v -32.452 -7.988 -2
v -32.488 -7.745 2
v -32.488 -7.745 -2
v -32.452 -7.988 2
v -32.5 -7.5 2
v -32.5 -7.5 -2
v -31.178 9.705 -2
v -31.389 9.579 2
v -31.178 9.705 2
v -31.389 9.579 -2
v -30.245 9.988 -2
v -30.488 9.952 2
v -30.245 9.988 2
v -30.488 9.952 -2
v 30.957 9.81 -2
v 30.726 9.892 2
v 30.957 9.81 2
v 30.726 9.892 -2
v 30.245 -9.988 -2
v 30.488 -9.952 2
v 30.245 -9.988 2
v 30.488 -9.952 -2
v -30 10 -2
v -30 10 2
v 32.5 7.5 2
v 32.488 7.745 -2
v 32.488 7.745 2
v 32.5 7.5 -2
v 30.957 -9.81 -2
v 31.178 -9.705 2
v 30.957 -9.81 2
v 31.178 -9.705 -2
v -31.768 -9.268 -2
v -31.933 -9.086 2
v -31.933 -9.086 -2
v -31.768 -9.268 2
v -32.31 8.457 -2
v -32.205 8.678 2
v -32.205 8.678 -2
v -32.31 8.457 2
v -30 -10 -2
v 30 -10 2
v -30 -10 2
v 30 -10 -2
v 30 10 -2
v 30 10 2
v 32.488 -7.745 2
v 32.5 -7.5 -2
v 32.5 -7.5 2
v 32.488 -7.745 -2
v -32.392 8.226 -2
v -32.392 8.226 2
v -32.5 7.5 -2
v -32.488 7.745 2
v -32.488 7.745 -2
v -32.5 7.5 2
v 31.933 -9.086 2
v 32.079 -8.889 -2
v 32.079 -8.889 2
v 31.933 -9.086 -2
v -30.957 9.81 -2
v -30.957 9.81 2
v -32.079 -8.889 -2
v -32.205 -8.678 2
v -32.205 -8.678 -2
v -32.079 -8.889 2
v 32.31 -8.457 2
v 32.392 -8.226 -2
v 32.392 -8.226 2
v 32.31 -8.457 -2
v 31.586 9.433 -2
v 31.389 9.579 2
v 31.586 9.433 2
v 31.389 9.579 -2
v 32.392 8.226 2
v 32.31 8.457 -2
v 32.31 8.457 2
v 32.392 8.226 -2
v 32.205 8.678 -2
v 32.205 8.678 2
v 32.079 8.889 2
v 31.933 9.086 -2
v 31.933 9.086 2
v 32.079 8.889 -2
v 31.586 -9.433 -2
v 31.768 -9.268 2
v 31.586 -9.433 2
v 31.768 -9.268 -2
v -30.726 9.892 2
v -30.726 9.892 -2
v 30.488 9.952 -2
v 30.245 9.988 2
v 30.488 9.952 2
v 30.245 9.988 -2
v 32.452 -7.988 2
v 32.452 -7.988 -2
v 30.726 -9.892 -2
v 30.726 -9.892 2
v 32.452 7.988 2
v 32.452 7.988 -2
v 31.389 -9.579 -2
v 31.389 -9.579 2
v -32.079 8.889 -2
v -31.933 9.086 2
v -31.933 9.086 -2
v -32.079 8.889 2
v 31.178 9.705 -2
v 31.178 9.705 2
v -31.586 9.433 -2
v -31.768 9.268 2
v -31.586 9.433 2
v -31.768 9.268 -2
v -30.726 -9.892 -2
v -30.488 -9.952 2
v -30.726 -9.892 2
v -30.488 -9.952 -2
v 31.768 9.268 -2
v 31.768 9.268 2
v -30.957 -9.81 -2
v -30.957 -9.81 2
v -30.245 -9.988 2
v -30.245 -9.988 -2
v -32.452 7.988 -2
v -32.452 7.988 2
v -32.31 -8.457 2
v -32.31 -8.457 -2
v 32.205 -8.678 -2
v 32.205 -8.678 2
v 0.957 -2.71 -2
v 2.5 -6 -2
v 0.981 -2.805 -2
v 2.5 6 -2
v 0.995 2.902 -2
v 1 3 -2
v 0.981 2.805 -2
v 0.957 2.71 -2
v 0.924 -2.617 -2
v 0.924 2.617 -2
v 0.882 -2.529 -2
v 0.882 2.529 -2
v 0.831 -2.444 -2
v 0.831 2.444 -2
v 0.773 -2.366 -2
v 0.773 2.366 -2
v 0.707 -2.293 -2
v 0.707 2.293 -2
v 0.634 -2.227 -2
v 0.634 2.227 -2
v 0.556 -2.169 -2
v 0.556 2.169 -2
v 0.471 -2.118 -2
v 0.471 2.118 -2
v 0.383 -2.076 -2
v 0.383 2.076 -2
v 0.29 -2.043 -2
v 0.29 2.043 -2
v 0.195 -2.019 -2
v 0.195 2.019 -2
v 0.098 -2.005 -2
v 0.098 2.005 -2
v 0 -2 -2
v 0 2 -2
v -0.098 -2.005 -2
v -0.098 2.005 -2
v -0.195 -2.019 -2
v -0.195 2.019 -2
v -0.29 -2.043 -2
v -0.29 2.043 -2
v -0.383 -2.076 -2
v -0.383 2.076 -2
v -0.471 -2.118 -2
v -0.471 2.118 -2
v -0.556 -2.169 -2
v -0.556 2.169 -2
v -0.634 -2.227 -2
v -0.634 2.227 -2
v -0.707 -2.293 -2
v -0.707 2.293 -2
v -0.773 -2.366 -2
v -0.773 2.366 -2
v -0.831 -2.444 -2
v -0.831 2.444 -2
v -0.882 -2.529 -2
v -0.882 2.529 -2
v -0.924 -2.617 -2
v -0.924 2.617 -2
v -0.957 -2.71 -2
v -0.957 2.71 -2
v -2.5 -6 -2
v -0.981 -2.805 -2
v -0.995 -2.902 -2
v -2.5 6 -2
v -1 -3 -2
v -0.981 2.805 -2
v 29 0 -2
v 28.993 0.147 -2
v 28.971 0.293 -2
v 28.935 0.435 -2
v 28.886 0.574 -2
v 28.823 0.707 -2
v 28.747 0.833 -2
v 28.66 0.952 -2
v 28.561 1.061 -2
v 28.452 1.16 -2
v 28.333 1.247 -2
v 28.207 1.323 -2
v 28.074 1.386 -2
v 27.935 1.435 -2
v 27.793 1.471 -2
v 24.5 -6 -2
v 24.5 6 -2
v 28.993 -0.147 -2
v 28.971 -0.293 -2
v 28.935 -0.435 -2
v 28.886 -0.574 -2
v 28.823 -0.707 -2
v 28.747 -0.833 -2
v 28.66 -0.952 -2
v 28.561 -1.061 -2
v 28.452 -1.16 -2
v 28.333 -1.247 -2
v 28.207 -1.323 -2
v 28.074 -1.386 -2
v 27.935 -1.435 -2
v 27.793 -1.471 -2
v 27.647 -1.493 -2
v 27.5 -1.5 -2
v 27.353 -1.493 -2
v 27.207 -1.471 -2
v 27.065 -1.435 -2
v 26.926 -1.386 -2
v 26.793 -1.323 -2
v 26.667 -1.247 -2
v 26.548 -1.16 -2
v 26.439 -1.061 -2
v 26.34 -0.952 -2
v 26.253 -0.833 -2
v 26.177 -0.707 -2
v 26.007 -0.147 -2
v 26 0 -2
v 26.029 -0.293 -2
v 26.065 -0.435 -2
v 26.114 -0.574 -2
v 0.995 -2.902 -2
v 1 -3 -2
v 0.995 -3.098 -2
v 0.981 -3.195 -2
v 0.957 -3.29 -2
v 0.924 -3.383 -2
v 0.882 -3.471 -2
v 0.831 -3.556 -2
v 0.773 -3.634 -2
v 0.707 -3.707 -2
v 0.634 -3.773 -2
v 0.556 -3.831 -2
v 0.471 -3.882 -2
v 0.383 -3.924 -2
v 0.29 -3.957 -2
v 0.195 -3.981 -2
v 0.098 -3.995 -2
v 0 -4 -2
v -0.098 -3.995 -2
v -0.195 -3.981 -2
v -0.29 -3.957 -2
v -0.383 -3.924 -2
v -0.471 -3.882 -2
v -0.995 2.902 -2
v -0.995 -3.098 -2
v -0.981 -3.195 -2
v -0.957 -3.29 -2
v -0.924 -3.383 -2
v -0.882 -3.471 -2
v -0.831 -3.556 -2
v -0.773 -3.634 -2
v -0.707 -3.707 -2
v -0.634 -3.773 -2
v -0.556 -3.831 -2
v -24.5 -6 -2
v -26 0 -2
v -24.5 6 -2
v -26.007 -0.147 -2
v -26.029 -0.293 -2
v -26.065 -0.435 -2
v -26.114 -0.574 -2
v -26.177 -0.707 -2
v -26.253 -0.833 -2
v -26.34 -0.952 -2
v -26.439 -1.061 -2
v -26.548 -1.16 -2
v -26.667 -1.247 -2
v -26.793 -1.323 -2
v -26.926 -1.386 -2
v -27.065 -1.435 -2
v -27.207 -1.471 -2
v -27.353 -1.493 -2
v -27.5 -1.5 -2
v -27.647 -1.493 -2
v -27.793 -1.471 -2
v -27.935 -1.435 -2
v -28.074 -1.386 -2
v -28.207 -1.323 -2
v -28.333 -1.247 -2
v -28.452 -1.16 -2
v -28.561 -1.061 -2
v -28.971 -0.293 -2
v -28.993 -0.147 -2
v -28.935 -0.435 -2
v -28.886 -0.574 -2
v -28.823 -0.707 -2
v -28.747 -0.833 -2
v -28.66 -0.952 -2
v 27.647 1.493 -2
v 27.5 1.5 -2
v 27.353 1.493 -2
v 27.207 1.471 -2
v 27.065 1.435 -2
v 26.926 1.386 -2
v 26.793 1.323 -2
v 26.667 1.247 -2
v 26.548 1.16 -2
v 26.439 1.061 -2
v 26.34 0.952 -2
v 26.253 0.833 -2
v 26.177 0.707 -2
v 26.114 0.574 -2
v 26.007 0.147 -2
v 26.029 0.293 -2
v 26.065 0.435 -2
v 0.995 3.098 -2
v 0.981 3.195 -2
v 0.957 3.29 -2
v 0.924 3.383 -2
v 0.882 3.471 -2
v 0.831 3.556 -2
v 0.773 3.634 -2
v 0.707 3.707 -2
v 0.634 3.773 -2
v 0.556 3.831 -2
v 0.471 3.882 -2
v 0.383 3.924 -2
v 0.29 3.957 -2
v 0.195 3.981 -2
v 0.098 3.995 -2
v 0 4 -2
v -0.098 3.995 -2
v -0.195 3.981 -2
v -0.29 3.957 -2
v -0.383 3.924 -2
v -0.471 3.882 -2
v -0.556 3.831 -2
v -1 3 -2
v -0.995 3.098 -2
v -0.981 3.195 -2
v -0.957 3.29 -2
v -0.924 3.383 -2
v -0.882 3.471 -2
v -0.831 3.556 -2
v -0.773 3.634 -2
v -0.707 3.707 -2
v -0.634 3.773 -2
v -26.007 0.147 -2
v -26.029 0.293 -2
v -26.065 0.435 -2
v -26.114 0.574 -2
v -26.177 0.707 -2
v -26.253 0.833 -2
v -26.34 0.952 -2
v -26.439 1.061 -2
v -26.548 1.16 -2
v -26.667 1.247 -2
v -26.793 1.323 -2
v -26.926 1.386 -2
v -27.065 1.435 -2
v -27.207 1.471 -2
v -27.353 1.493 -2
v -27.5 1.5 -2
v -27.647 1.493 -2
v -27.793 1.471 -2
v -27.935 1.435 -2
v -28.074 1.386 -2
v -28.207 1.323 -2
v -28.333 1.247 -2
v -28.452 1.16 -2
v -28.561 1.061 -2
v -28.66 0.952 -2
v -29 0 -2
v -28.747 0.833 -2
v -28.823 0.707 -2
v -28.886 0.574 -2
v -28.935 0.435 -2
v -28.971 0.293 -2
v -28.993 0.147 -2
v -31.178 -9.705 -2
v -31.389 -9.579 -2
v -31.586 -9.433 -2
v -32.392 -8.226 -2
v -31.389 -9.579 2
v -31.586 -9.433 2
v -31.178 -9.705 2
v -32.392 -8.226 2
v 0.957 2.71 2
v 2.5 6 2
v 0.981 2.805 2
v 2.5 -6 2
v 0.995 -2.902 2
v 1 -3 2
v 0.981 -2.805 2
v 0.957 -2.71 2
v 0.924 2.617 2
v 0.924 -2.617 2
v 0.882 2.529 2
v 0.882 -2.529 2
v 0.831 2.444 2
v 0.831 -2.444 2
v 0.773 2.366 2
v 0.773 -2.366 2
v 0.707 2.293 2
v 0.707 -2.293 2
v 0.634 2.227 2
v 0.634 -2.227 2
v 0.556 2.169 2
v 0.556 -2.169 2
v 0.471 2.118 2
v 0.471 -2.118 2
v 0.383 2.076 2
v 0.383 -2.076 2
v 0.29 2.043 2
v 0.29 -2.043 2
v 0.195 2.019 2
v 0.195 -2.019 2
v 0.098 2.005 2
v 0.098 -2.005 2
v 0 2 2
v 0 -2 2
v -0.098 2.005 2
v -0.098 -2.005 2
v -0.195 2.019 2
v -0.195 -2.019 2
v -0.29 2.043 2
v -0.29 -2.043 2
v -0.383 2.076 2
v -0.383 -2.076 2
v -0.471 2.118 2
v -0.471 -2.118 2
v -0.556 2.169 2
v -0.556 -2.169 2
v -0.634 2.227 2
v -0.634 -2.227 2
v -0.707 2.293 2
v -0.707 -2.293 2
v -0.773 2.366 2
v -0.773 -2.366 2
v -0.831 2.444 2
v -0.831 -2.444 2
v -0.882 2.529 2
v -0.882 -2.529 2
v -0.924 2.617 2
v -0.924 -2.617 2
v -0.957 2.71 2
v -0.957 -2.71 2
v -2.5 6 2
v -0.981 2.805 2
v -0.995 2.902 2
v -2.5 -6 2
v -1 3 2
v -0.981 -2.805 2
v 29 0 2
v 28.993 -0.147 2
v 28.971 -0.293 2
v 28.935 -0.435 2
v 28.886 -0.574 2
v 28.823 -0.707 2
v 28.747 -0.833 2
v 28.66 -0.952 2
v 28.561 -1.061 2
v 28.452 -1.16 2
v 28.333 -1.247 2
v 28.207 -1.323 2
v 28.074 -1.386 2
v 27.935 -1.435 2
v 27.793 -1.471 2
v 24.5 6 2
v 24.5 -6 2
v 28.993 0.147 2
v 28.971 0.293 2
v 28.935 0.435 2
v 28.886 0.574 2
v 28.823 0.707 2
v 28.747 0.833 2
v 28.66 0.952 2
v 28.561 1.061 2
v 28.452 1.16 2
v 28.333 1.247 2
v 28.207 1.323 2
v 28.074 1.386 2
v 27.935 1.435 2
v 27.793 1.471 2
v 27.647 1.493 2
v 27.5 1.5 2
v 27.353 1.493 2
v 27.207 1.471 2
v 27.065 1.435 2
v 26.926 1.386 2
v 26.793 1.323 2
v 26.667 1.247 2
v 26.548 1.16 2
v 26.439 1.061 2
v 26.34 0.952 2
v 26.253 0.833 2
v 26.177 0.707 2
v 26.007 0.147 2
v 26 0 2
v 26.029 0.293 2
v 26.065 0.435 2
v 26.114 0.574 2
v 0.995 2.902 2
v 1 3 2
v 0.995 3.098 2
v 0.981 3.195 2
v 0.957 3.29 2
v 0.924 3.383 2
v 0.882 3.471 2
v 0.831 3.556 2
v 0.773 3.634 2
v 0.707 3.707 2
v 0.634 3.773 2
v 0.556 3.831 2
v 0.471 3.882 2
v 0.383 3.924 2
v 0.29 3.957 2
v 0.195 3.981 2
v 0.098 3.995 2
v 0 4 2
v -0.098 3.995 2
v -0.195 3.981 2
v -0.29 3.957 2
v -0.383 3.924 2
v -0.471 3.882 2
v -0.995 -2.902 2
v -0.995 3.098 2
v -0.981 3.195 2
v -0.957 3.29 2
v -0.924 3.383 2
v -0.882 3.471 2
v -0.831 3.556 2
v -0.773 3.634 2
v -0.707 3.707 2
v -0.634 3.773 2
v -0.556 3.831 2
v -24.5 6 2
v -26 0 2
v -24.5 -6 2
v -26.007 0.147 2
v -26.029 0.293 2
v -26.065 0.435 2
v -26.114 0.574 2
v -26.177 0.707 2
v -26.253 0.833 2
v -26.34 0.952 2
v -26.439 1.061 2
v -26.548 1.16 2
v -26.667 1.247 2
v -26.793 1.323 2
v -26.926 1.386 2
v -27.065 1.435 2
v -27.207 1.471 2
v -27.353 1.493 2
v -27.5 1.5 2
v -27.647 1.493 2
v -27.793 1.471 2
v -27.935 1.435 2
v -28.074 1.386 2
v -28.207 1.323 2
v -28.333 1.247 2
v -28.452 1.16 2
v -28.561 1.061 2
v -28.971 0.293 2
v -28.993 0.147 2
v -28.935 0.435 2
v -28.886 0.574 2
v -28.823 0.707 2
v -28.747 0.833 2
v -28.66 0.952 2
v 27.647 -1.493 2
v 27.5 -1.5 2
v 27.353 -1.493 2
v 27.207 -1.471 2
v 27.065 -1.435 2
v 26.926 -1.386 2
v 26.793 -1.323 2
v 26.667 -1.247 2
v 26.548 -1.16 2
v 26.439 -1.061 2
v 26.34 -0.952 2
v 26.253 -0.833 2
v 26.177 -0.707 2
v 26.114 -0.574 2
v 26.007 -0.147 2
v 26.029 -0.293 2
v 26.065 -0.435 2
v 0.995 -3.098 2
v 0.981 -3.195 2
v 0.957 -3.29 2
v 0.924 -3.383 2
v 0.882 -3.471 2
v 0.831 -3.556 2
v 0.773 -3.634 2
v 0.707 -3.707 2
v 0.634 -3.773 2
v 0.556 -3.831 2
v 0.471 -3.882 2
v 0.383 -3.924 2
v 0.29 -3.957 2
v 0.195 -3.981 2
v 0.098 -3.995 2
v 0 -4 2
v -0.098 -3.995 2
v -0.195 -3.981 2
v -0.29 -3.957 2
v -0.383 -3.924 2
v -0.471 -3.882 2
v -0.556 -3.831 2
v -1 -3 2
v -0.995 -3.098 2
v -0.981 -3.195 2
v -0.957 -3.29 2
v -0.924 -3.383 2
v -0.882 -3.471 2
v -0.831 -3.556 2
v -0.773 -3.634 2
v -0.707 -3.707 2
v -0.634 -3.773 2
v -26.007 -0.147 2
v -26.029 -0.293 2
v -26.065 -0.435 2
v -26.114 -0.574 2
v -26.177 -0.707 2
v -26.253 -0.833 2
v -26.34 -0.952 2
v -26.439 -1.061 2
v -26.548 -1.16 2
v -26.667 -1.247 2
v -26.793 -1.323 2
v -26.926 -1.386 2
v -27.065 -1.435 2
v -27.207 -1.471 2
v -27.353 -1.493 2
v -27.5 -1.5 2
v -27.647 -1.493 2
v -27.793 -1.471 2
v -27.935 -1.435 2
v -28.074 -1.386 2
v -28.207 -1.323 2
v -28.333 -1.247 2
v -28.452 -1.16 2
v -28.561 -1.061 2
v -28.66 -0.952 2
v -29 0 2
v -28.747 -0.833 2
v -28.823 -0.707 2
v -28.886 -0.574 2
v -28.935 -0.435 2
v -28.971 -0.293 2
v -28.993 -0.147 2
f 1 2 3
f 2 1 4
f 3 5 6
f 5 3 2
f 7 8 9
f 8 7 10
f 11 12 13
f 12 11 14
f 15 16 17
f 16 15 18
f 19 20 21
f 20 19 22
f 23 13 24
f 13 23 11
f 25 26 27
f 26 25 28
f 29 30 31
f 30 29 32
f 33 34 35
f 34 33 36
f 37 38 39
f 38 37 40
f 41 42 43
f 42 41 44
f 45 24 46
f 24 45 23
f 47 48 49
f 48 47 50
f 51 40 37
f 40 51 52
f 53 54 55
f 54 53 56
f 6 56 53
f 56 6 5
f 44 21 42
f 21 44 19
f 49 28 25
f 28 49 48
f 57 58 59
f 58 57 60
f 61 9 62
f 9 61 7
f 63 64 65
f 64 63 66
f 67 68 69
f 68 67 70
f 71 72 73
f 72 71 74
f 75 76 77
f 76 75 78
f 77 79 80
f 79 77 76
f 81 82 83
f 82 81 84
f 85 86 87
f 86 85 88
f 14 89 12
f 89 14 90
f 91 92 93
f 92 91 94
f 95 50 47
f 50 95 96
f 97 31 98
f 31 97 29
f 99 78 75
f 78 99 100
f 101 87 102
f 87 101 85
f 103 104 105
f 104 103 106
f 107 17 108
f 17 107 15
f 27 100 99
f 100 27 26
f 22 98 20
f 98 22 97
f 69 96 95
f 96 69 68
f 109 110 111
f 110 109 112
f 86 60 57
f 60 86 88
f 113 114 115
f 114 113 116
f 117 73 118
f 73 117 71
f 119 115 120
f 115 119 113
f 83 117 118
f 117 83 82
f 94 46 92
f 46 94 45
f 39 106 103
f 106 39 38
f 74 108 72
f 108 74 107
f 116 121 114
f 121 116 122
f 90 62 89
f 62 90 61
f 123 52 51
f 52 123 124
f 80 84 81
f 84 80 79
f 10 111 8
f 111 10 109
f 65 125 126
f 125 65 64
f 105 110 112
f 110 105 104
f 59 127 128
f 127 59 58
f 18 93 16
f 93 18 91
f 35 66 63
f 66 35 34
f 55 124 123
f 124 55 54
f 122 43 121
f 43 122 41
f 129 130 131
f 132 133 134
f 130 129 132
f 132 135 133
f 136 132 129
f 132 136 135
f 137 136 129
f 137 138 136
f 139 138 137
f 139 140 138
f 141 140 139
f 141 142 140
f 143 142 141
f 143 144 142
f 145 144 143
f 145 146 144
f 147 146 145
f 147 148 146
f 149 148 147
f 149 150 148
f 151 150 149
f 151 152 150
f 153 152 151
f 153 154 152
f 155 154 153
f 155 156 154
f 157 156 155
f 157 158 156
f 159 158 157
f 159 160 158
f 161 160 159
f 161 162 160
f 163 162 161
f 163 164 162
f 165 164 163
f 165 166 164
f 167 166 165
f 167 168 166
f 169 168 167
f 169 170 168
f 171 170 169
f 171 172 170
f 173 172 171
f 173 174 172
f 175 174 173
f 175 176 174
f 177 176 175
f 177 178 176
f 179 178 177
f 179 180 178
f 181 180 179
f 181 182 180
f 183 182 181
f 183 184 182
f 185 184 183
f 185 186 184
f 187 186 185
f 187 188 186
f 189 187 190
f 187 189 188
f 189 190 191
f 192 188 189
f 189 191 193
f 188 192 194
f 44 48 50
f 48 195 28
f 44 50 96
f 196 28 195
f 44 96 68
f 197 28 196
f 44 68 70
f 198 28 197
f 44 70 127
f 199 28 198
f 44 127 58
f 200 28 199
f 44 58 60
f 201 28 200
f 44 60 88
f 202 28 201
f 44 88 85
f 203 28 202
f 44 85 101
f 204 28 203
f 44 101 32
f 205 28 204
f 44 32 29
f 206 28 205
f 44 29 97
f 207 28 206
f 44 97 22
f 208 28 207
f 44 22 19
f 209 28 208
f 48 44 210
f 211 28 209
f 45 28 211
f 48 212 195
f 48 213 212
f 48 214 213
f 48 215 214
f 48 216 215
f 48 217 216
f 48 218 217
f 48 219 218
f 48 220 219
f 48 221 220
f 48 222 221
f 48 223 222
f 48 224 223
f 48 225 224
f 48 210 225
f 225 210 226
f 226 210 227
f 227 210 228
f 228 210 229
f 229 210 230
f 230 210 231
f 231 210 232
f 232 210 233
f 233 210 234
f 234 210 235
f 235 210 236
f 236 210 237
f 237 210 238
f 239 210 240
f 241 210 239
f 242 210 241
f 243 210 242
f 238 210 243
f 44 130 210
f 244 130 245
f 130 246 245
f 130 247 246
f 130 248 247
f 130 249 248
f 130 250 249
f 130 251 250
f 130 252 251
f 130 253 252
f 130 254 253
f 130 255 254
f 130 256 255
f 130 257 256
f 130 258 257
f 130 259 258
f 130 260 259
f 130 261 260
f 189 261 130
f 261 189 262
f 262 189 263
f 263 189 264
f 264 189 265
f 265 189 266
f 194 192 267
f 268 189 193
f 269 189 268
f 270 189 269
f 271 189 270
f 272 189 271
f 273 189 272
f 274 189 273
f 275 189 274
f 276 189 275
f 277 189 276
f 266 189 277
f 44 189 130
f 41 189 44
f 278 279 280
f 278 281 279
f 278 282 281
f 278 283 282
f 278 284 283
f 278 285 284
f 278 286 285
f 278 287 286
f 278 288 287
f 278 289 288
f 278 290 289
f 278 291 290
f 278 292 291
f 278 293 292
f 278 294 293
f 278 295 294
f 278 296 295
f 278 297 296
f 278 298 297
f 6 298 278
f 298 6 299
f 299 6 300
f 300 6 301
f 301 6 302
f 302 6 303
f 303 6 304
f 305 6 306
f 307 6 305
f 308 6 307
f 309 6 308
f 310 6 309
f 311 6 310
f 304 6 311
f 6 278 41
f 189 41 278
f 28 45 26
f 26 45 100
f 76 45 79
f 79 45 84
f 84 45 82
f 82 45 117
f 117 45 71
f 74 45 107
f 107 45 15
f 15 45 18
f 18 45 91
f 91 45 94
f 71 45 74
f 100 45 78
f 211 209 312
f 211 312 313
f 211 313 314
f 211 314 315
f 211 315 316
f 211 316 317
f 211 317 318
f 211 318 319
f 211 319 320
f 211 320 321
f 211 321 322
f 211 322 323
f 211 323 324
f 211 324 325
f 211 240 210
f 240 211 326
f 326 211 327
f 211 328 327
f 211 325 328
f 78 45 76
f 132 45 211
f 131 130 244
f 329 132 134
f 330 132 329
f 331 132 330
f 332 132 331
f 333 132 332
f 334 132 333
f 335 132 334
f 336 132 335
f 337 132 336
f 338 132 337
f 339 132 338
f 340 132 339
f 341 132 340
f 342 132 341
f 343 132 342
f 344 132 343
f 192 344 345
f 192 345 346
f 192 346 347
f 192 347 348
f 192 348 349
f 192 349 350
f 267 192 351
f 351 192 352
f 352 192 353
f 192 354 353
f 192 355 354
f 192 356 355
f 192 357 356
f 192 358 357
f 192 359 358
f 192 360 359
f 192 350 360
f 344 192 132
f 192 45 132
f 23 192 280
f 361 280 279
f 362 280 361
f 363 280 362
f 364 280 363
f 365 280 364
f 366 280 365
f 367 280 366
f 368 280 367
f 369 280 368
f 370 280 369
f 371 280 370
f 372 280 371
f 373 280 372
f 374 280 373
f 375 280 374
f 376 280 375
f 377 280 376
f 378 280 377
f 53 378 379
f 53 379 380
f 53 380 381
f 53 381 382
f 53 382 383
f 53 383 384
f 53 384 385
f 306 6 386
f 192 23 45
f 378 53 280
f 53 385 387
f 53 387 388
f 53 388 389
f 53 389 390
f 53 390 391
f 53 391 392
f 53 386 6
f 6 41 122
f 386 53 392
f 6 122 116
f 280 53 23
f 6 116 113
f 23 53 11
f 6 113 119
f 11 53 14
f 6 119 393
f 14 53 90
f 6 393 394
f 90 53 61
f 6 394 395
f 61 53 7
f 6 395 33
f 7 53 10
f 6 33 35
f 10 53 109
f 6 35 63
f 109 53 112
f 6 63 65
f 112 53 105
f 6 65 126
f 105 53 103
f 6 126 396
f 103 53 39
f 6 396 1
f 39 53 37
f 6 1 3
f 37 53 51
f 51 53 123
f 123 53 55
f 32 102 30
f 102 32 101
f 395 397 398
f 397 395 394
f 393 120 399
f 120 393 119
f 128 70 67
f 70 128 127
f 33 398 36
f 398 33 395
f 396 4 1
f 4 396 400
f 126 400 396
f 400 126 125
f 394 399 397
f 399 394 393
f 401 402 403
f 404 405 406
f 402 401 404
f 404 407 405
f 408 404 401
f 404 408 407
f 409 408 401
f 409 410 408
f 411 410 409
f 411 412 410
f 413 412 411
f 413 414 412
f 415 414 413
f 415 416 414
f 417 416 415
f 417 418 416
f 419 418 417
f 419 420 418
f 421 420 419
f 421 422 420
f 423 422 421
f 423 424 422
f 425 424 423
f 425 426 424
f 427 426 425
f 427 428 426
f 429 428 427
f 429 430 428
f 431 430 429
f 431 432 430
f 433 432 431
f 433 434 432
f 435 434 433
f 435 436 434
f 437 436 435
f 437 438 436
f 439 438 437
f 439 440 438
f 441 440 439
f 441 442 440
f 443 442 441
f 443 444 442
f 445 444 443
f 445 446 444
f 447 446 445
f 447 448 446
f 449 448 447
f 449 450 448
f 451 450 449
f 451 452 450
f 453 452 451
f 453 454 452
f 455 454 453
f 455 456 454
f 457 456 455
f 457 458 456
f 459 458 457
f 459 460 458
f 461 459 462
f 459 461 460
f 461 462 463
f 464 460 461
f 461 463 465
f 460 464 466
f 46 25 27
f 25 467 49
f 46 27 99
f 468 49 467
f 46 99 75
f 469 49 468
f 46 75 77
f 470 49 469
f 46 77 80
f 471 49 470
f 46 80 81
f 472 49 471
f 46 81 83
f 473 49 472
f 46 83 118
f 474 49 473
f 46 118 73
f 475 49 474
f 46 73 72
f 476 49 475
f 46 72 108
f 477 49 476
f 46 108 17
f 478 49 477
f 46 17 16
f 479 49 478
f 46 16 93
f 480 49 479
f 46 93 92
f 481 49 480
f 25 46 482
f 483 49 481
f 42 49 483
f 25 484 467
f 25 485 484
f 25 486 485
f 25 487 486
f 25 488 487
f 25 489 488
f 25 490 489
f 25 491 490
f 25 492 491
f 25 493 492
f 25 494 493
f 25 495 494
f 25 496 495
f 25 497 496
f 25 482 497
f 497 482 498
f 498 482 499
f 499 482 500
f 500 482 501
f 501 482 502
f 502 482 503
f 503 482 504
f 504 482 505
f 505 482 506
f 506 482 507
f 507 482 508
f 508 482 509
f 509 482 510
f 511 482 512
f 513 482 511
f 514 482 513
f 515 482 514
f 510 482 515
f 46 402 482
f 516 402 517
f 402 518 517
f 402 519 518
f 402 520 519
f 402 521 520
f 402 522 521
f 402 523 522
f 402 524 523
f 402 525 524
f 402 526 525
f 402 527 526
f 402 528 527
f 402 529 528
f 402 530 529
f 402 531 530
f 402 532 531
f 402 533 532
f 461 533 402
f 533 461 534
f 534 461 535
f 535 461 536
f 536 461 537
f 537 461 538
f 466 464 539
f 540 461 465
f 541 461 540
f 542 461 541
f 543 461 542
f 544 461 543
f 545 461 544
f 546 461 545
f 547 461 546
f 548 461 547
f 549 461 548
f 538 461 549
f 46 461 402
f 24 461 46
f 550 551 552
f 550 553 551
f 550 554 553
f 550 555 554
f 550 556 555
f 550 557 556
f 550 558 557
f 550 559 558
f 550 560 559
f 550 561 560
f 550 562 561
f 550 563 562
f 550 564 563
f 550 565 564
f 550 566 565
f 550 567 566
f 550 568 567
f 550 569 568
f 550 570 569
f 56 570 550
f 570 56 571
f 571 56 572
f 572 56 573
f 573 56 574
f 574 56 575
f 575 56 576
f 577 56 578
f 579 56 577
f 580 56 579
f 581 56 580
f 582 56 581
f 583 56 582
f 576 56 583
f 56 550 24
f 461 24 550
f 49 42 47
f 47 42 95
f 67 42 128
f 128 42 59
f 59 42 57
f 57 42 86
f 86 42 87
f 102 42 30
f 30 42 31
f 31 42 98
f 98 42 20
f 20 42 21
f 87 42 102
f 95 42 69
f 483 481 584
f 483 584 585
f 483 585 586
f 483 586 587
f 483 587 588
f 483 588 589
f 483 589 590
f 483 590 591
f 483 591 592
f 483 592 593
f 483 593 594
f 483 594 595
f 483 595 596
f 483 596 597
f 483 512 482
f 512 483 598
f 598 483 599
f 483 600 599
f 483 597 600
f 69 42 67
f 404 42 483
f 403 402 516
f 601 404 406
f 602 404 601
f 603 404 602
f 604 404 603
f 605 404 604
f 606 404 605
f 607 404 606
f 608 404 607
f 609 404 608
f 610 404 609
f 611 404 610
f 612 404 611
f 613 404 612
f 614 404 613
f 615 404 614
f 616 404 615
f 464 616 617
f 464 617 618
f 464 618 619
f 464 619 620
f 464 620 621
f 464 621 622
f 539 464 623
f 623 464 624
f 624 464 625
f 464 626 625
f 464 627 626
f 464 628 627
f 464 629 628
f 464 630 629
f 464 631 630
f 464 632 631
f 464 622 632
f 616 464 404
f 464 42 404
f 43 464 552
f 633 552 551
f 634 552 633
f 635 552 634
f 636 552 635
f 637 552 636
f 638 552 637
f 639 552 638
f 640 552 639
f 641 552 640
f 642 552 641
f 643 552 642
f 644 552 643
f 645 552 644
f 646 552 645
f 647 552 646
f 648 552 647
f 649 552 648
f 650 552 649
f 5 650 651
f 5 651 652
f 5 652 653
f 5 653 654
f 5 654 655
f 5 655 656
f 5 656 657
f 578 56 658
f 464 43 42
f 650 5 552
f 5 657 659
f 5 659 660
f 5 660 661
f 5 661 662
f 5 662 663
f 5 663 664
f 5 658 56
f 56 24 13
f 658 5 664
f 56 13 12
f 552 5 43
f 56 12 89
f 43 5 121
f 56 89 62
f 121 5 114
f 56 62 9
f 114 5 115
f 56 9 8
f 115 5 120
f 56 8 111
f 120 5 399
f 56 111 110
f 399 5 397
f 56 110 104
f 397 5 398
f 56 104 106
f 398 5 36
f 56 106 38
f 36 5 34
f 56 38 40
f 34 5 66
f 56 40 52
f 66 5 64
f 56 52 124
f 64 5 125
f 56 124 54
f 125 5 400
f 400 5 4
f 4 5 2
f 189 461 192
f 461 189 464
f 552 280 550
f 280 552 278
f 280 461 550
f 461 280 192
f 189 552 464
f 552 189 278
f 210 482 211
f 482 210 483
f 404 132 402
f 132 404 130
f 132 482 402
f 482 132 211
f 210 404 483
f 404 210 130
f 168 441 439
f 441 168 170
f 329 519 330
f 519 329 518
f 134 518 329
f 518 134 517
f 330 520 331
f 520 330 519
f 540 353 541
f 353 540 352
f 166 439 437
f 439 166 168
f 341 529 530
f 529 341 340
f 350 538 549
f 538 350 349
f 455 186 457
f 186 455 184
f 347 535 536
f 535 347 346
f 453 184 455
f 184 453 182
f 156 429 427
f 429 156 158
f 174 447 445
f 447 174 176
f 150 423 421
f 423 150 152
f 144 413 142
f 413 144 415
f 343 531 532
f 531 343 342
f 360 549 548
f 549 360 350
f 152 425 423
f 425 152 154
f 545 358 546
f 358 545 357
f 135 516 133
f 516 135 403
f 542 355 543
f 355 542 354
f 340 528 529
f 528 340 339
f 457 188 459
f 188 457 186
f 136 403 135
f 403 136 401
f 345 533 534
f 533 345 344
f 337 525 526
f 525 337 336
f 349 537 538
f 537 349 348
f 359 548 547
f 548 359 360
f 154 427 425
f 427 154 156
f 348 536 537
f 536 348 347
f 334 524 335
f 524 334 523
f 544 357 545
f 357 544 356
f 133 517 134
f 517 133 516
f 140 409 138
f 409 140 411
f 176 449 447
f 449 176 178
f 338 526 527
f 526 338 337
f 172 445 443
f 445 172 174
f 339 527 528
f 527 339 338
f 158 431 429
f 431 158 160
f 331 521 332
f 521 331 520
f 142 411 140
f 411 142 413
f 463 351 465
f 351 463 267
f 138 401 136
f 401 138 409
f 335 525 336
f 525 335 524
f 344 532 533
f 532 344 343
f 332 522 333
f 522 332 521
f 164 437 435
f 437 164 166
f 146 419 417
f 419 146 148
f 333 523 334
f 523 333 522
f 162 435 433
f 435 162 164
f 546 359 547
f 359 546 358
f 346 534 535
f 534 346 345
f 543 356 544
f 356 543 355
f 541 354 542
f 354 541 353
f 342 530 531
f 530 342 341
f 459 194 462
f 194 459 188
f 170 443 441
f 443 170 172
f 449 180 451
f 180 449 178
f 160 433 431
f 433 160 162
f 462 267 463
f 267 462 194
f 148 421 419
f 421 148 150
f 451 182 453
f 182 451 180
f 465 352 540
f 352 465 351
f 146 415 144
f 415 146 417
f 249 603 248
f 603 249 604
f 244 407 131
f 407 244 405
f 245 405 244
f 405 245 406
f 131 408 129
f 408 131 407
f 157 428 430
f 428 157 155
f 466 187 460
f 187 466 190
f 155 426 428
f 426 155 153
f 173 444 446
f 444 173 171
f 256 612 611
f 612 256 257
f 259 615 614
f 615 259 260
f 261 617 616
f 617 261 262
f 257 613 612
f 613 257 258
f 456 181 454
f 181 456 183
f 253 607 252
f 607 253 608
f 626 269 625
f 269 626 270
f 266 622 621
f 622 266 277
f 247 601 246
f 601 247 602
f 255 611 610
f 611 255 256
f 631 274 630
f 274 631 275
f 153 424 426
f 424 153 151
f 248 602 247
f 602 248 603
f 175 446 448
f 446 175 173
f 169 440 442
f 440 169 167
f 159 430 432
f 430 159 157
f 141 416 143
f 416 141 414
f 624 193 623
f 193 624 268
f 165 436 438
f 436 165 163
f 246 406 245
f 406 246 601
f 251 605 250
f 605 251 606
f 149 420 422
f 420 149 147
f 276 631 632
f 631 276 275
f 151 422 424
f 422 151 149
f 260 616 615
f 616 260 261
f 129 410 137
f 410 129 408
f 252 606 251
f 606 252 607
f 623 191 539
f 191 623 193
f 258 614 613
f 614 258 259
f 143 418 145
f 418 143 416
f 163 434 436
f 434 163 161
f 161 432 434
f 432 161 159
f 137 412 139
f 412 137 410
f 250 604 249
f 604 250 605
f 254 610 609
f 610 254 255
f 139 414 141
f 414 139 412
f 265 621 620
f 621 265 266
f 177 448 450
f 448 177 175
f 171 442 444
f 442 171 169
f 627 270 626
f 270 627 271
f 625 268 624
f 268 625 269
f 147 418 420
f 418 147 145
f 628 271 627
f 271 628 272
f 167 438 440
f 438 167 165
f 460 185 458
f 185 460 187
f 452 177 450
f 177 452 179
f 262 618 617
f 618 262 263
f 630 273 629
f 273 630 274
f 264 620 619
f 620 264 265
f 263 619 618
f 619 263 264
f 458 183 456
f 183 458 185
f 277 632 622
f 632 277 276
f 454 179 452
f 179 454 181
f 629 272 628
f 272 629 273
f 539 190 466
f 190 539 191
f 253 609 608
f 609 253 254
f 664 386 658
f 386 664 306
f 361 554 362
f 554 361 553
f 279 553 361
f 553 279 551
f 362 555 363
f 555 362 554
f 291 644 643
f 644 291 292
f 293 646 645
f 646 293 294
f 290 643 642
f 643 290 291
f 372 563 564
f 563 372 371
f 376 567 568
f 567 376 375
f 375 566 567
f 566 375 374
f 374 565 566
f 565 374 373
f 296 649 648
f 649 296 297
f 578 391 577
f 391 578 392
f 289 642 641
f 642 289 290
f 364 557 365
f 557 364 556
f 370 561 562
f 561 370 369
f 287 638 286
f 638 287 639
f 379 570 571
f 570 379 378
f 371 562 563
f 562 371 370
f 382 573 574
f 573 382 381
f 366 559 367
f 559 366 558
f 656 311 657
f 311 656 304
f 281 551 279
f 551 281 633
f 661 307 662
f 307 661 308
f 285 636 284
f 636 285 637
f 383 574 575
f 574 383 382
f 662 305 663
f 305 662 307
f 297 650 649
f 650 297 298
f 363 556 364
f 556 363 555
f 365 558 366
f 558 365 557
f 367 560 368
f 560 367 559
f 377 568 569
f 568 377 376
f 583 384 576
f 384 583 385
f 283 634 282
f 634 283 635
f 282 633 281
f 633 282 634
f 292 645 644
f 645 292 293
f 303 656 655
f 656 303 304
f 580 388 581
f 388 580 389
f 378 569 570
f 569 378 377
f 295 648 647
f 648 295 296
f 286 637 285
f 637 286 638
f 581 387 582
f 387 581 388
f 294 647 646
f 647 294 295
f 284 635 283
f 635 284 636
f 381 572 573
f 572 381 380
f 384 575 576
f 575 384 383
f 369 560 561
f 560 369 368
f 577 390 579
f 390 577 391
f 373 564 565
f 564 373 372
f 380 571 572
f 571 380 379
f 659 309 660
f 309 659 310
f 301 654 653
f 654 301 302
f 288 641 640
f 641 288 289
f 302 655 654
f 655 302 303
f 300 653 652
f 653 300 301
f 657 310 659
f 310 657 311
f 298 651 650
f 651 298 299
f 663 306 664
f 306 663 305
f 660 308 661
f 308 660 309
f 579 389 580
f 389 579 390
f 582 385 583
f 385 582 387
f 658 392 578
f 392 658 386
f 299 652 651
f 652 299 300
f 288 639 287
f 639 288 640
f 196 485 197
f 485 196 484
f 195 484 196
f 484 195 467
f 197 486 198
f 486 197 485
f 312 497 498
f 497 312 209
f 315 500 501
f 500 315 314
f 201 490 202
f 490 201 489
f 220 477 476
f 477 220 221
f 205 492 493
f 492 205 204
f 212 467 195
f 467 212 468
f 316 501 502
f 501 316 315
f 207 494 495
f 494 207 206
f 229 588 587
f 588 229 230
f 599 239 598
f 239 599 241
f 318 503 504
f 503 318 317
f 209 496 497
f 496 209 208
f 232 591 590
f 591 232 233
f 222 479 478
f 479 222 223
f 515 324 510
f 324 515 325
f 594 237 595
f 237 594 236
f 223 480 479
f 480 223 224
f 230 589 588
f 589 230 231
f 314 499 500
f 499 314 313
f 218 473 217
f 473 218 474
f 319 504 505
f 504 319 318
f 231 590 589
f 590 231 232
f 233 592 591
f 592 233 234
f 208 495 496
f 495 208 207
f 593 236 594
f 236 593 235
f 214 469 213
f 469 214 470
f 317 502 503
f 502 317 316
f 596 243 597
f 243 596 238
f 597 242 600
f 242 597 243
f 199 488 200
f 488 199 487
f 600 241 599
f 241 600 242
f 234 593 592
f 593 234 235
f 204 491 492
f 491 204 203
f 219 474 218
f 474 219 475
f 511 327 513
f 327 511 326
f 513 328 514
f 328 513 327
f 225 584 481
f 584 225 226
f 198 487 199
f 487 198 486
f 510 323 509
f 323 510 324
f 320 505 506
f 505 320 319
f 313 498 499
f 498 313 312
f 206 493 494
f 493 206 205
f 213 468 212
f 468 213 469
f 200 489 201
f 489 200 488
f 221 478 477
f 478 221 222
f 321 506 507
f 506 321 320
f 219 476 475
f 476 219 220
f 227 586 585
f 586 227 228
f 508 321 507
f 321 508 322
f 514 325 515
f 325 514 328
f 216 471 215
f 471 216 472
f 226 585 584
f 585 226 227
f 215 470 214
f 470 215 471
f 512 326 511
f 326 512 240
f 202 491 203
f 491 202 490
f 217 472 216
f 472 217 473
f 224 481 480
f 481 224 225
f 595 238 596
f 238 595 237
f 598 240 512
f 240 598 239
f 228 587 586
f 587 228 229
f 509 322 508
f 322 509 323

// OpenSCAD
// Thin rectangular faceplate/frame with rounded corners and cutouts
// Bounding box: 65 x 20 x 4 mm

$fn = 64;

// Parameters
plate_L = 65.0;                 // overall length (X)
plate_W = 20.0;                 // overall width  (Y)
plate_T = 4.0;                  // thickness      (Z)
corner_R = 2.5;                 // outer corner radius

win_W = 22.0;                   // window width (X)
win_H = 12.0;                   // window height (Y)
win_gap = 5.0;                  // gap between windows (X)
win_y_offset = 0.0;             // window center offset (Y)

center_hole_d = 2.0;            // two small holes between windows
center_hole_pitch_y = 6.0;      // spacing in Y between the two center holes

mount_hole_d = 3.0;             // mounting holes near ends
mount_hole_x_inset = 5.0;       // inset from each end in X
mount_hole_y_offset = 0.0;      // mounting hole offset in Y

cut_through_extra = 1.0;        // extra cut depth to ensure through-cuts

// Helpers
module rounded_rect_2d(L, W, R) {
    // Robust rounded rectangle in 2D
    R2 = min(R, min(L, W)/2);
    hull() {
        for (sx = [-1, 1], sy = [-1, 1])
            translate([sx*(L/2 - R2), sy*(W/2 - R2)])
                circle(r=R2);
    }
}

module plate_solid() {
    linear_extrude(height=plate_T, center=true)
        rounded_rect_2d(plate_L, plate_W, corner_R);
}

module window_cutout(xc) {
    translate([xc, win_y_offset, 0])
        cube([win_W, win_H, plate_T + 2*cut_through_extra], center=true);
}

module hole_cutout(x, y, d) {
    translate([x, y, 0])
        cylinder(d=d, h=plate_T + 2*cut_through_extra, center=true);
}

// Derived positions
win_center_offset_x = (win_gap/2 + win_W/2);
mount_x = plate_L/2 - mount_hole_x_inset;

// Final model
difference() {
    plate_solid();

    // Two rectangular windows
    window_cutout(-win_center_offset_x);
    window_cutout( win_center_offset_x);

    // Two small circular holes centered between windows (stacked in Y)
    hole_cutout(0,  center_hole_pitch_y/2, center_hole_d);
    hole_cutout(0, -center_hole_pitch_y/2, center_hole_d);

    // Mounting holes near each end
    hole_cutout(-mount_x, mount_hole_y_offset, mount_hole_d);
    hole_cutout( mount_x, mount_hole_y_offset, mount_hole_d);
}
